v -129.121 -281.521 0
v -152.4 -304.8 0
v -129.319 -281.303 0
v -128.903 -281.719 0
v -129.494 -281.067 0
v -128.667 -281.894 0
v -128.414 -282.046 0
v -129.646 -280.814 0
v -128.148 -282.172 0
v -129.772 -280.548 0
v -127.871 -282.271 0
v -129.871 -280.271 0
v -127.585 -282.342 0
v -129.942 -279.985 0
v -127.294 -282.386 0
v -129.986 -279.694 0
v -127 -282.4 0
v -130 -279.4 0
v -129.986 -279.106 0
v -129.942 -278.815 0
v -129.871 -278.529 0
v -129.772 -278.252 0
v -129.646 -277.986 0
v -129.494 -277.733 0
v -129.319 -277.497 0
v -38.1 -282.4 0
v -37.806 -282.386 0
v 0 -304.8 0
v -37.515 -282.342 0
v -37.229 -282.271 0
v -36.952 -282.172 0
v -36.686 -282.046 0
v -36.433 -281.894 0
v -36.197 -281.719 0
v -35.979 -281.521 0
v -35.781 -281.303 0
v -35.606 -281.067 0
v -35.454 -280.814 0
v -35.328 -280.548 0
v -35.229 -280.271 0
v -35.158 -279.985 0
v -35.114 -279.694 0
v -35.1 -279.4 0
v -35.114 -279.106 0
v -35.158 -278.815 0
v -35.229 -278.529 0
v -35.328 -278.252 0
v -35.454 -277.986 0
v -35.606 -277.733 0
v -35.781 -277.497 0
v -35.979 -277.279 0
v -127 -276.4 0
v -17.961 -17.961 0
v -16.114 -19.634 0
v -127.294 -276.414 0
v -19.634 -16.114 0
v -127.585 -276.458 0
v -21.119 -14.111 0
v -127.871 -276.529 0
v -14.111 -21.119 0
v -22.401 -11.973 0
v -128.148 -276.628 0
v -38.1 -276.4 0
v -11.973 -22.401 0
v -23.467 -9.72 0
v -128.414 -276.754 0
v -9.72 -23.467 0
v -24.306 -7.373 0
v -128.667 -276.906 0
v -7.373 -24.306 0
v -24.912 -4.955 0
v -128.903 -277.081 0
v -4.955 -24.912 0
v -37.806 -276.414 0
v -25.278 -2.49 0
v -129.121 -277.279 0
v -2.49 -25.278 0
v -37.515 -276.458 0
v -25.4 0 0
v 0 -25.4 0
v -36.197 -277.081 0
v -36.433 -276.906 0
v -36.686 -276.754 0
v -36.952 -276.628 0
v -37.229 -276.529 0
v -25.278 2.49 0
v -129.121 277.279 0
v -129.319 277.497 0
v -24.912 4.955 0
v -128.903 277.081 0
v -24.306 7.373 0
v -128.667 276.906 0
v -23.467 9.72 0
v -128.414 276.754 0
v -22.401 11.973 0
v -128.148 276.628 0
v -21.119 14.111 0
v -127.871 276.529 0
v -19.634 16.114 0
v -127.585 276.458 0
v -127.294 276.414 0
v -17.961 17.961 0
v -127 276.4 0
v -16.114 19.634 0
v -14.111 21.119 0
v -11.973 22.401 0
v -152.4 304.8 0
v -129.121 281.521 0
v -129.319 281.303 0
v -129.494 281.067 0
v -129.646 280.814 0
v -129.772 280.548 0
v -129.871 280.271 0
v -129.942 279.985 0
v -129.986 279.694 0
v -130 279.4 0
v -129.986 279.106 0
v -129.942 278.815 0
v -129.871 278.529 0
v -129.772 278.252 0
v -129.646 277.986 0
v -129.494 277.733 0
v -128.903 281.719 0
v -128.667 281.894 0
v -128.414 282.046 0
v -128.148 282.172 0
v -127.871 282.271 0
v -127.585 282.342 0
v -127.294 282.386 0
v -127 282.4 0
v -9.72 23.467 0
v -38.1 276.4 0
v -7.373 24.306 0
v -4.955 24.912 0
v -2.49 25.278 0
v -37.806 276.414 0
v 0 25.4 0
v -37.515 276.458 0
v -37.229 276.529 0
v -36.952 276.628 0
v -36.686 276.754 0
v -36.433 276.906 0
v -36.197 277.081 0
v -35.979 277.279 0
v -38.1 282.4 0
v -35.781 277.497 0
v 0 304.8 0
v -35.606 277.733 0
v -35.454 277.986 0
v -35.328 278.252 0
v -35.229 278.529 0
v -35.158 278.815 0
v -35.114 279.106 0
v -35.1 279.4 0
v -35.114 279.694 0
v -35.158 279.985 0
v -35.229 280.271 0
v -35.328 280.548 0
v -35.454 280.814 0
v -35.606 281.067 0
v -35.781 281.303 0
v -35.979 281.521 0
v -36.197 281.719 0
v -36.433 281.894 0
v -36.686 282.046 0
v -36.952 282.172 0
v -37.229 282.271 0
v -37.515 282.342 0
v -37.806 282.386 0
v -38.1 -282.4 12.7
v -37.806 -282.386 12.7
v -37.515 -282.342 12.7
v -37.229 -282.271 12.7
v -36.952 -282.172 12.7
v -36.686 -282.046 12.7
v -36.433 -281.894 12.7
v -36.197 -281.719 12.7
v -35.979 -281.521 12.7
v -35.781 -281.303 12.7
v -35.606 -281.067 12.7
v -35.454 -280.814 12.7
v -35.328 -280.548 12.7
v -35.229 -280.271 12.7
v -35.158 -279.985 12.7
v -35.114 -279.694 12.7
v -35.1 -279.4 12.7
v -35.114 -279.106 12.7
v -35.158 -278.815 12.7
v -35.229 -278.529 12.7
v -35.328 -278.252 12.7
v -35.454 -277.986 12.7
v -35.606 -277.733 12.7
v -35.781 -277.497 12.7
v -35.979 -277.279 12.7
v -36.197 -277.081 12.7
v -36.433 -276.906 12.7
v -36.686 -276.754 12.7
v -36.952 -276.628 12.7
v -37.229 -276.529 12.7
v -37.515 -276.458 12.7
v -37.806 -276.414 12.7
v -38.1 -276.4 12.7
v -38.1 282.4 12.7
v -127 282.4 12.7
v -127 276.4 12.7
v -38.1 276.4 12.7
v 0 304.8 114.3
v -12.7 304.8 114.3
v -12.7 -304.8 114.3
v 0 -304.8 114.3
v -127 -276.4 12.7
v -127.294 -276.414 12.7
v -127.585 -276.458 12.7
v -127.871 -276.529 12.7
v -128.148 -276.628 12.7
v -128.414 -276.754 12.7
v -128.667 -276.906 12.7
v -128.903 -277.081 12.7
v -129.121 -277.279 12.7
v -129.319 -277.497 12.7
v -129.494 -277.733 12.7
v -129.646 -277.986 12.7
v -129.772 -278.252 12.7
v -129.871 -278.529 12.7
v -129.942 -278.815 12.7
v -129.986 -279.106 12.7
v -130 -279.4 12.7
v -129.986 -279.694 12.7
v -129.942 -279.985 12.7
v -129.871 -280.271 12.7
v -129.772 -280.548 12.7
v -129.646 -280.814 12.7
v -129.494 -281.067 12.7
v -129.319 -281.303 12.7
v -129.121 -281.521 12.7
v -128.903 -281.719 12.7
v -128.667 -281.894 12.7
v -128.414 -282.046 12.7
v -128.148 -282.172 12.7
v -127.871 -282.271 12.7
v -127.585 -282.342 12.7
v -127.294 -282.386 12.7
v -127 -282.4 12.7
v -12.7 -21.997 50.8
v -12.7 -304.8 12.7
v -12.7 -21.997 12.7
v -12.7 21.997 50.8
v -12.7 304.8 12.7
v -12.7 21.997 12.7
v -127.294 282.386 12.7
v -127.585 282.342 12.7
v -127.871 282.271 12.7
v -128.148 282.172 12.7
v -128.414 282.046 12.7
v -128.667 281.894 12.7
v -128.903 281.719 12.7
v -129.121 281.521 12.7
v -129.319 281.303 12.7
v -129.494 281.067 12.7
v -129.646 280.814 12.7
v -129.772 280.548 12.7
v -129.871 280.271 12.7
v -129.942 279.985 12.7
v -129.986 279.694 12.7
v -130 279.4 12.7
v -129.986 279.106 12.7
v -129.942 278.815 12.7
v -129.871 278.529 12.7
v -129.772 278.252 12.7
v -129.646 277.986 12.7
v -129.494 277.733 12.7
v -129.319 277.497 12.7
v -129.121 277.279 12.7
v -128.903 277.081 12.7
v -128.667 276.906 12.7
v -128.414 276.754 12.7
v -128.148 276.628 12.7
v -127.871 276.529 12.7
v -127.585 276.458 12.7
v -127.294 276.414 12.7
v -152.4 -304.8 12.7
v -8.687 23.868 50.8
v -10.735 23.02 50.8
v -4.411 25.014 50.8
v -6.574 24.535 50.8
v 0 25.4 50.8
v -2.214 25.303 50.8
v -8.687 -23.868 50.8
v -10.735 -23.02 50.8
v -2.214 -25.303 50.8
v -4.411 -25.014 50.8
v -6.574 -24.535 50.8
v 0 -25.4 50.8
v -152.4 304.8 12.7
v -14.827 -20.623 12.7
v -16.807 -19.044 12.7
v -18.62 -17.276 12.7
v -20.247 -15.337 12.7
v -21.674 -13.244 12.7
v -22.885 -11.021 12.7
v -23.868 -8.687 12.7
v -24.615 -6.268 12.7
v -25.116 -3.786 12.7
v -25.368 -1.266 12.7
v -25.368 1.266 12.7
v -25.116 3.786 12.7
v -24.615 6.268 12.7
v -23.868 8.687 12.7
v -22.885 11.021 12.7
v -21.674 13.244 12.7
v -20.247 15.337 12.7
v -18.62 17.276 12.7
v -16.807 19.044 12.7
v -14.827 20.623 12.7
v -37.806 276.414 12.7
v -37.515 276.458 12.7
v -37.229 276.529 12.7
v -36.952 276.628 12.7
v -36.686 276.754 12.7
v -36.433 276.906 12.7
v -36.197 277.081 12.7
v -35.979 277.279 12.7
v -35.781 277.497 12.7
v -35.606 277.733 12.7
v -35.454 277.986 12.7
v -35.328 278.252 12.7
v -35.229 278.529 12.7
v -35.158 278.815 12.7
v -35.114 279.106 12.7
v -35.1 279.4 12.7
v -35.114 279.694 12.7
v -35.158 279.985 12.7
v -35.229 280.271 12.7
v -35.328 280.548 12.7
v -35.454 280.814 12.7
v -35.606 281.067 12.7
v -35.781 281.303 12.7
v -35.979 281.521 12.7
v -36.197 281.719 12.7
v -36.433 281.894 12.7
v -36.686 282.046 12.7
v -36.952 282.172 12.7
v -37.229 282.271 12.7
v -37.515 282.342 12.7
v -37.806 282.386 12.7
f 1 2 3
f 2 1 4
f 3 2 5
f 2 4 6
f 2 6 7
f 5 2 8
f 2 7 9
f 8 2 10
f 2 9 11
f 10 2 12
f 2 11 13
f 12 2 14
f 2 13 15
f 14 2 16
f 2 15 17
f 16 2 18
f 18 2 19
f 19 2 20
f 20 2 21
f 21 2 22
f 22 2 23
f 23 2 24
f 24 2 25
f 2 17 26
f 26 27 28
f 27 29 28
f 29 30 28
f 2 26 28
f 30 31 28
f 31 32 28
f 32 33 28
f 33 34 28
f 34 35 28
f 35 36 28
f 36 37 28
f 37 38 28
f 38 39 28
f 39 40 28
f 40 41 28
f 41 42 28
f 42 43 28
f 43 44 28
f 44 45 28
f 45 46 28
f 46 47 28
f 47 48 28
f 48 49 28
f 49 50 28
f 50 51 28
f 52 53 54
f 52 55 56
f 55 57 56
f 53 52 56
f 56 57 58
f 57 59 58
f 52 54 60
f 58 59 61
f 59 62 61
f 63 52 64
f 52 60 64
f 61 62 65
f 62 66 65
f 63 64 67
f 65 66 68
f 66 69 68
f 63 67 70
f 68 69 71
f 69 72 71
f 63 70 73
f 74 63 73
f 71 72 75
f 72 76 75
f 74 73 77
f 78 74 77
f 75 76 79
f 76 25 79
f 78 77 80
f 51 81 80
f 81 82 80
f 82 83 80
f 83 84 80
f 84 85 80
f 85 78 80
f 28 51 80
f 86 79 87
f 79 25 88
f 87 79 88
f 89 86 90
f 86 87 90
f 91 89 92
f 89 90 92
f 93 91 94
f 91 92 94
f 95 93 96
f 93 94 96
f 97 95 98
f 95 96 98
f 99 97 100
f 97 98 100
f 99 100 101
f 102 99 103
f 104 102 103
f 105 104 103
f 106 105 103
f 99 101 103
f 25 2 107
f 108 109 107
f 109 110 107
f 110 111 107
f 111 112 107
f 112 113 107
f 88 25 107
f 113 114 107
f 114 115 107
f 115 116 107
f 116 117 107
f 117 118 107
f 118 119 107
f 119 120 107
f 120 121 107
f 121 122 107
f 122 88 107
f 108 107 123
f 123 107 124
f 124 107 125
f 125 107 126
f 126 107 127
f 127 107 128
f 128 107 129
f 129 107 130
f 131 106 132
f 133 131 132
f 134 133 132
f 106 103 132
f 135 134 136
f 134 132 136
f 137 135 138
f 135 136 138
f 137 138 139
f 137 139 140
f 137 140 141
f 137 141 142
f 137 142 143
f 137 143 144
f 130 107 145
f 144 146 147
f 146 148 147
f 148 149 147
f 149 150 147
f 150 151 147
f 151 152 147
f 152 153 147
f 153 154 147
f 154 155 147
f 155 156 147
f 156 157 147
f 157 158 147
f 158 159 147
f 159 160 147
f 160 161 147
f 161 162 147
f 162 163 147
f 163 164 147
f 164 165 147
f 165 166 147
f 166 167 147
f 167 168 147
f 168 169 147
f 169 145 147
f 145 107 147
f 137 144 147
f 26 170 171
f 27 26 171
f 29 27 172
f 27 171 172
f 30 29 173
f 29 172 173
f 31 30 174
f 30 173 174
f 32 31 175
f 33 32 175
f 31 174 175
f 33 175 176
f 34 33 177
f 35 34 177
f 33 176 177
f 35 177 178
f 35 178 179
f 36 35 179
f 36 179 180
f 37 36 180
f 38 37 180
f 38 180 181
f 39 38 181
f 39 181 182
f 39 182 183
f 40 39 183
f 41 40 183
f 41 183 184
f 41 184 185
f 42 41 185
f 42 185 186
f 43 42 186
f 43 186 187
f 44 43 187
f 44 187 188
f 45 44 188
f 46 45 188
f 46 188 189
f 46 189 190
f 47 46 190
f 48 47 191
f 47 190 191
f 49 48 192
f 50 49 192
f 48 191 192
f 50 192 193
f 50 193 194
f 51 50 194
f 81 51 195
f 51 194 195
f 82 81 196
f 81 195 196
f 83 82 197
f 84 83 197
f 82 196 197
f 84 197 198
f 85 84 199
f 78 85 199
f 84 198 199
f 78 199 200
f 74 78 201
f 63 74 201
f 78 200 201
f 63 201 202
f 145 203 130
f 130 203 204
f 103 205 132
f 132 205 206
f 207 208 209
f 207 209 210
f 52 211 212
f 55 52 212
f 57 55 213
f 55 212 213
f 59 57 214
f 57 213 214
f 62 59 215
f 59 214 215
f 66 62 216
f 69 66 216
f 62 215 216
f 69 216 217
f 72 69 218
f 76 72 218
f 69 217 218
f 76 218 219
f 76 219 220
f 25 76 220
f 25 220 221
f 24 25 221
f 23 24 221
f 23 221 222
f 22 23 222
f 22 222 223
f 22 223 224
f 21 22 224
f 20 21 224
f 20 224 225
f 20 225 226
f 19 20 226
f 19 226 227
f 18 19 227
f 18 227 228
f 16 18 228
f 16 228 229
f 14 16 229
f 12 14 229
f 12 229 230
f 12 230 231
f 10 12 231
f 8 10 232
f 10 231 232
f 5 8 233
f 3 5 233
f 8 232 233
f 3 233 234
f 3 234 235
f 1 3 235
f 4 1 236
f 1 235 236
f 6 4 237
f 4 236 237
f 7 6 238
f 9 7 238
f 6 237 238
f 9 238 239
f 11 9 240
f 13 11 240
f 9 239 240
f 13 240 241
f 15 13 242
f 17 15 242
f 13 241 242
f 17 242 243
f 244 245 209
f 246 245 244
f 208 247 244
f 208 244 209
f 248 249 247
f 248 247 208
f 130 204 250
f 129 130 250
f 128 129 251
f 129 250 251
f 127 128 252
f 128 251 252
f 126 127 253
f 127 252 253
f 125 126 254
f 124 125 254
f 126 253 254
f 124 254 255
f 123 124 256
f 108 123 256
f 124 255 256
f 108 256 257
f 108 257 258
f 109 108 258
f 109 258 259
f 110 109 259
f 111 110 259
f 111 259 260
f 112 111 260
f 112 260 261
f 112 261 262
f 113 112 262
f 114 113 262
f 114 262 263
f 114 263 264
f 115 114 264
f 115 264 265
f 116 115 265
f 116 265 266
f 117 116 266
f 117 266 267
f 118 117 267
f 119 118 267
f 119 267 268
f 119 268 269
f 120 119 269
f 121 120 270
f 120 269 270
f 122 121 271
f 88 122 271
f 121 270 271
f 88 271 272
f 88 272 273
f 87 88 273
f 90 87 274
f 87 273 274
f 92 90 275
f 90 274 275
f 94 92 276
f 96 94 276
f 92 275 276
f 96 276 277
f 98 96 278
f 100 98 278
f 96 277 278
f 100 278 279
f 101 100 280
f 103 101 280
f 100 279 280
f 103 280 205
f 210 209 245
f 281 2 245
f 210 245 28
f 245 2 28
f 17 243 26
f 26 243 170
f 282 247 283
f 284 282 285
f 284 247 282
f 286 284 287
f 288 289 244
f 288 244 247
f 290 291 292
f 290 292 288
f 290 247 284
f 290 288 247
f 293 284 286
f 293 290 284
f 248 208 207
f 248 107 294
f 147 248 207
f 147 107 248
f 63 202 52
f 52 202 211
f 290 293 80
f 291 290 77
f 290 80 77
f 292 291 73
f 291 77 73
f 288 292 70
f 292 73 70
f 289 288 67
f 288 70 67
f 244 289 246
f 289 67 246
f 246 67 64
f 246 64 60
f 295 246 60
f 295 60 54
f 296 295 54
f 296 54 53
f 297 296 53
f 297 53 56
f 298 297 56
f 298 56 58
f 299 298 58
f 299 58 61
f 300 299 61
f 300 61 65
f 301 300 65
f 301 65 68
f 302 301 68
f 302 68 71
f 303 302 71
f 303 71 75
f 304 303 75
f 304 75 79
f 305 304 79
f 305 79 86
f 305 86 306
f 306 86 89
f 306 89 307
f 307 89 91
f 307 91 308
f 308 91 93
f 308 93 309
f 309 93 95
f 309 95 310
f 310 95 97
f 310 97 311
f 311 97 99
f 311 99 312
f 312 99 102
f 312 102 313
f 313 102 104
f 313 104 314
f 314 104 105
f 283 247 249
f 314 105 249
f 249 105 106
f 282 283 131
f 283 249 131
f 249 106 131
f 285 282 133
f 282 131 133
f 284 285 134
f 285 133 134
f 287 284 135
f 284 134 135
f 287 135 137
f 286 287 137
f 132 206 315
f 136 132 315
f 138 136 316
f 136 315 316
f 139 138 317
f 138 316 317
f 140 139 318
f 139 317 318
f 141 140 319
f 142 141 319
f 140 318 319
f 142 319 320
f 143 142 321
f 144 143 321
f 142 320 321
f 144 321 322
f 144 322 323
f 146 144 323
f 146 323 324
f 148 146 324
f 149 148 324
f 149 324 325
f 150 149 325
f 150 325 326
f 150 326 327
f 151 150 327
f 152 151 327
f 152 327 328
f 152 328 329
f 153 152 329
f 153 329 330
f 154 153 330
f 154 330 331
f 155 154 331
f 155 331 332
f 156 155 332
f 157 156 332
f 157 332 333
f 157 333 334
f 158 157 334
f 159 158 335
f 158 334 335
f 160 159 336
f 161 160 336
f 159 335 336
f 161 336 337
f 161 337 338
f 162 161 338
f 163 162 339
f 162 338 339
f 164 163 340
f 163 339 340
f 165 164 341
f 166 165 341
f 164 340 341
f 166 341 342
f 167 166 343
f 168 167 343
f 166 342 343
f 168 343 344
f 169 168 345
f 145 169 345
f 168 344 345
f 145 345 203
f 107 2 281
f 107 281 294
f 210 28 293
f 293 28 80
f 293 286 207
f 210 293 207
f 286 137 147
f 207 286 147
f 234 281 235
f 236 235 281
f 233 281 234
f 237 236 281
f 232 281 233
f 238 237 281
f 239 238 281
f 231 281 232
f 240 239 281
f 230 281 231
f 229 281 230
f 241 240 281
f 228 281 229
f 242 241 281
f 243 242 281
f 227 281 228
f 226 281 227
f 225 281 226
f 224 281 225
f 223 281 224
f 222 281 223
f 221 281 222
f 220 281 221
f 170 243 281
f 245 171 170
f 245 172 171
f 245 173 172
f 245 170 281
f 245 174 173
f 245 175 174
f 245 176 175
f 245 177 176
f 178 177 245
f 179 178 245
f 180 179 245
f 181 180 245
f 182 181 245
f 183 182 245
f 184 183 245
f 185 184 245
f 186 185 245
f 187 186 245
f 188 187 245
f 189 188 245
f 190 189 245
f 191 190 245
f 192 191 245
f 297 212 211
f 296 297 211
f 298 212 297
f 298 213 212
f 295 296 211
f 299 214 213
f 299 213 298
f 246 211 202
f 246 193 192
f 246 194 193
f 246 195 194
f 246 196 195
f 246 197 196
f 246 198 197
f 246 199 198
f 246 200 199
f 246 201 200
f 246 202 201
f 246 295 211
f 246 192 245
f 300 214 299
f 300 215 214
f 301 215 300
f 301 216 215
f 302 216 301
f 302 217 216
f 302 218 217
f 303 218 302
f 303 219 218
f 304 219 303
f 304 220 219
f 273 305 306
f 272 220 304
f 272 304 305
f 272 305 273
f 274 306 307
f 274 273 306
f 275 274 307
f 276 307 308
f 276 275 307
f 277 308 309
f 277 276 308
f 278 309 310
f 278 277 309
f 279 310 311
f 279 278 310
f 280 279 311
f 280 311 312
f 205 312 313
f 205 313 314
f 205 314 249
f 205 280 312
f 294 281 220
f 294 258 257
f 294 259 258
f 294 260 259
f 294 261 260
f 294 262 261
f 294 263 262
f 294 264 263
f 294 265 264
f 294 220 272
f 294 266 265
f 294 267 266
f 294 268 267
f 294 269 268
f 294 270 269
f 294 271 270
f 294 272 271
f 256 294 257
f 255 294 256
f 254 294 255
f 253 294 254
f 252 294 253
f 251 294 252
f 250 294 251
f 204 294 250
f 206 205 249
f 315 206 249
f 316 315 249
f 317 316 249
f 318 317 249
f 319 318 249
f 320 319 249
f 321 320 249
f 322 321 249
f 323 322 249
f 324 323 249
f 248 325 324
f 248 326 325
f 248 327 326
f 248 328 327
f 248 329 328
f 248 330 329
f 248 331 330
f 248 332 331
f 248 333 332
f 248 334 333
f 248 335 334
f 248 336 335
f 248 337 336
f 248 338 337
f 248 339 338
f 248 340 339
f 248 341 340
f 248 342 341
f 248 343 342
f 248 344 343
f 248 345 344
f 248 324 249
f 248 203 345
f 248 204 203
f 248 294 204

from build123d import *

# Parameters (mm, degrees)
F0_W     = 152.4
F0_H     = 609.6
F1_DEPTH = 12.7
F2_W     = 12.7
F2_H     = 609.6
F3_DEPTH = 101.6
F5_DEPTH = 25
F6_R     = 25.4
F7_DEPTH = 50.8


with BuildPart() as f1:
    # F0 (on Top) → F1 (new body)
    with BuildSketch(Plane.XY):
        with Locations((-76.2, 0)):
            Rectangle(F0_W, F0_H)
    extrude(amount=F1_DEPTH)

    # F2 (on face) → F3 (join)
    with BuildSketch(Plane.XY.offset(12.7)):
        with Locations((-6.35, 0)):
            Rectangle(F2_W, F2_H)
    extrude(amount=F3_DEPTH)

    # F4 (on face) → F5 (cut)
    with BuildSketch(Plane.XY.offset(12.7)):
        with BuildLine():
            Line((-38.1, 282.4), (-127, 282.4))
            ThreePointArc((-127, 282.4), (-130, 279.4), (-127, 276.4))
            Line((-127, 276.4), (-38.1, 276.4))
            ThreePointArc((-38.1, 276.4), (-35.1, 279.4), (-38.1, 282.4))
        make_face()
        with BuildLine():
            Line((-38.1, -276.4), (-127, -276.4))
            ThreePointArc((-127, -276.4), (-130, -279.4), (-127, -282.4))
            Line((-127, -282.4), (-38.1, -282.4))
            ThreePointArc((-38.1, -282.4), (-35.1, -279.4), (-38.1, -276.4))
        make_face()
    extrude(amount=-F5_DEPTH, mode=Mode.SUBTRACT)

    # F6 (on face) → F7 (cut)
    with BuildSketch(Plane(origin=(0, 0, 0), x_dir=(1, 0, 0), z_dir=(0, 0, -1))):
        Circle(F6_R)
    extrude(amount=-F7_DEPTH, mode=Mode.SUBTRACT)


solid = f1.part
